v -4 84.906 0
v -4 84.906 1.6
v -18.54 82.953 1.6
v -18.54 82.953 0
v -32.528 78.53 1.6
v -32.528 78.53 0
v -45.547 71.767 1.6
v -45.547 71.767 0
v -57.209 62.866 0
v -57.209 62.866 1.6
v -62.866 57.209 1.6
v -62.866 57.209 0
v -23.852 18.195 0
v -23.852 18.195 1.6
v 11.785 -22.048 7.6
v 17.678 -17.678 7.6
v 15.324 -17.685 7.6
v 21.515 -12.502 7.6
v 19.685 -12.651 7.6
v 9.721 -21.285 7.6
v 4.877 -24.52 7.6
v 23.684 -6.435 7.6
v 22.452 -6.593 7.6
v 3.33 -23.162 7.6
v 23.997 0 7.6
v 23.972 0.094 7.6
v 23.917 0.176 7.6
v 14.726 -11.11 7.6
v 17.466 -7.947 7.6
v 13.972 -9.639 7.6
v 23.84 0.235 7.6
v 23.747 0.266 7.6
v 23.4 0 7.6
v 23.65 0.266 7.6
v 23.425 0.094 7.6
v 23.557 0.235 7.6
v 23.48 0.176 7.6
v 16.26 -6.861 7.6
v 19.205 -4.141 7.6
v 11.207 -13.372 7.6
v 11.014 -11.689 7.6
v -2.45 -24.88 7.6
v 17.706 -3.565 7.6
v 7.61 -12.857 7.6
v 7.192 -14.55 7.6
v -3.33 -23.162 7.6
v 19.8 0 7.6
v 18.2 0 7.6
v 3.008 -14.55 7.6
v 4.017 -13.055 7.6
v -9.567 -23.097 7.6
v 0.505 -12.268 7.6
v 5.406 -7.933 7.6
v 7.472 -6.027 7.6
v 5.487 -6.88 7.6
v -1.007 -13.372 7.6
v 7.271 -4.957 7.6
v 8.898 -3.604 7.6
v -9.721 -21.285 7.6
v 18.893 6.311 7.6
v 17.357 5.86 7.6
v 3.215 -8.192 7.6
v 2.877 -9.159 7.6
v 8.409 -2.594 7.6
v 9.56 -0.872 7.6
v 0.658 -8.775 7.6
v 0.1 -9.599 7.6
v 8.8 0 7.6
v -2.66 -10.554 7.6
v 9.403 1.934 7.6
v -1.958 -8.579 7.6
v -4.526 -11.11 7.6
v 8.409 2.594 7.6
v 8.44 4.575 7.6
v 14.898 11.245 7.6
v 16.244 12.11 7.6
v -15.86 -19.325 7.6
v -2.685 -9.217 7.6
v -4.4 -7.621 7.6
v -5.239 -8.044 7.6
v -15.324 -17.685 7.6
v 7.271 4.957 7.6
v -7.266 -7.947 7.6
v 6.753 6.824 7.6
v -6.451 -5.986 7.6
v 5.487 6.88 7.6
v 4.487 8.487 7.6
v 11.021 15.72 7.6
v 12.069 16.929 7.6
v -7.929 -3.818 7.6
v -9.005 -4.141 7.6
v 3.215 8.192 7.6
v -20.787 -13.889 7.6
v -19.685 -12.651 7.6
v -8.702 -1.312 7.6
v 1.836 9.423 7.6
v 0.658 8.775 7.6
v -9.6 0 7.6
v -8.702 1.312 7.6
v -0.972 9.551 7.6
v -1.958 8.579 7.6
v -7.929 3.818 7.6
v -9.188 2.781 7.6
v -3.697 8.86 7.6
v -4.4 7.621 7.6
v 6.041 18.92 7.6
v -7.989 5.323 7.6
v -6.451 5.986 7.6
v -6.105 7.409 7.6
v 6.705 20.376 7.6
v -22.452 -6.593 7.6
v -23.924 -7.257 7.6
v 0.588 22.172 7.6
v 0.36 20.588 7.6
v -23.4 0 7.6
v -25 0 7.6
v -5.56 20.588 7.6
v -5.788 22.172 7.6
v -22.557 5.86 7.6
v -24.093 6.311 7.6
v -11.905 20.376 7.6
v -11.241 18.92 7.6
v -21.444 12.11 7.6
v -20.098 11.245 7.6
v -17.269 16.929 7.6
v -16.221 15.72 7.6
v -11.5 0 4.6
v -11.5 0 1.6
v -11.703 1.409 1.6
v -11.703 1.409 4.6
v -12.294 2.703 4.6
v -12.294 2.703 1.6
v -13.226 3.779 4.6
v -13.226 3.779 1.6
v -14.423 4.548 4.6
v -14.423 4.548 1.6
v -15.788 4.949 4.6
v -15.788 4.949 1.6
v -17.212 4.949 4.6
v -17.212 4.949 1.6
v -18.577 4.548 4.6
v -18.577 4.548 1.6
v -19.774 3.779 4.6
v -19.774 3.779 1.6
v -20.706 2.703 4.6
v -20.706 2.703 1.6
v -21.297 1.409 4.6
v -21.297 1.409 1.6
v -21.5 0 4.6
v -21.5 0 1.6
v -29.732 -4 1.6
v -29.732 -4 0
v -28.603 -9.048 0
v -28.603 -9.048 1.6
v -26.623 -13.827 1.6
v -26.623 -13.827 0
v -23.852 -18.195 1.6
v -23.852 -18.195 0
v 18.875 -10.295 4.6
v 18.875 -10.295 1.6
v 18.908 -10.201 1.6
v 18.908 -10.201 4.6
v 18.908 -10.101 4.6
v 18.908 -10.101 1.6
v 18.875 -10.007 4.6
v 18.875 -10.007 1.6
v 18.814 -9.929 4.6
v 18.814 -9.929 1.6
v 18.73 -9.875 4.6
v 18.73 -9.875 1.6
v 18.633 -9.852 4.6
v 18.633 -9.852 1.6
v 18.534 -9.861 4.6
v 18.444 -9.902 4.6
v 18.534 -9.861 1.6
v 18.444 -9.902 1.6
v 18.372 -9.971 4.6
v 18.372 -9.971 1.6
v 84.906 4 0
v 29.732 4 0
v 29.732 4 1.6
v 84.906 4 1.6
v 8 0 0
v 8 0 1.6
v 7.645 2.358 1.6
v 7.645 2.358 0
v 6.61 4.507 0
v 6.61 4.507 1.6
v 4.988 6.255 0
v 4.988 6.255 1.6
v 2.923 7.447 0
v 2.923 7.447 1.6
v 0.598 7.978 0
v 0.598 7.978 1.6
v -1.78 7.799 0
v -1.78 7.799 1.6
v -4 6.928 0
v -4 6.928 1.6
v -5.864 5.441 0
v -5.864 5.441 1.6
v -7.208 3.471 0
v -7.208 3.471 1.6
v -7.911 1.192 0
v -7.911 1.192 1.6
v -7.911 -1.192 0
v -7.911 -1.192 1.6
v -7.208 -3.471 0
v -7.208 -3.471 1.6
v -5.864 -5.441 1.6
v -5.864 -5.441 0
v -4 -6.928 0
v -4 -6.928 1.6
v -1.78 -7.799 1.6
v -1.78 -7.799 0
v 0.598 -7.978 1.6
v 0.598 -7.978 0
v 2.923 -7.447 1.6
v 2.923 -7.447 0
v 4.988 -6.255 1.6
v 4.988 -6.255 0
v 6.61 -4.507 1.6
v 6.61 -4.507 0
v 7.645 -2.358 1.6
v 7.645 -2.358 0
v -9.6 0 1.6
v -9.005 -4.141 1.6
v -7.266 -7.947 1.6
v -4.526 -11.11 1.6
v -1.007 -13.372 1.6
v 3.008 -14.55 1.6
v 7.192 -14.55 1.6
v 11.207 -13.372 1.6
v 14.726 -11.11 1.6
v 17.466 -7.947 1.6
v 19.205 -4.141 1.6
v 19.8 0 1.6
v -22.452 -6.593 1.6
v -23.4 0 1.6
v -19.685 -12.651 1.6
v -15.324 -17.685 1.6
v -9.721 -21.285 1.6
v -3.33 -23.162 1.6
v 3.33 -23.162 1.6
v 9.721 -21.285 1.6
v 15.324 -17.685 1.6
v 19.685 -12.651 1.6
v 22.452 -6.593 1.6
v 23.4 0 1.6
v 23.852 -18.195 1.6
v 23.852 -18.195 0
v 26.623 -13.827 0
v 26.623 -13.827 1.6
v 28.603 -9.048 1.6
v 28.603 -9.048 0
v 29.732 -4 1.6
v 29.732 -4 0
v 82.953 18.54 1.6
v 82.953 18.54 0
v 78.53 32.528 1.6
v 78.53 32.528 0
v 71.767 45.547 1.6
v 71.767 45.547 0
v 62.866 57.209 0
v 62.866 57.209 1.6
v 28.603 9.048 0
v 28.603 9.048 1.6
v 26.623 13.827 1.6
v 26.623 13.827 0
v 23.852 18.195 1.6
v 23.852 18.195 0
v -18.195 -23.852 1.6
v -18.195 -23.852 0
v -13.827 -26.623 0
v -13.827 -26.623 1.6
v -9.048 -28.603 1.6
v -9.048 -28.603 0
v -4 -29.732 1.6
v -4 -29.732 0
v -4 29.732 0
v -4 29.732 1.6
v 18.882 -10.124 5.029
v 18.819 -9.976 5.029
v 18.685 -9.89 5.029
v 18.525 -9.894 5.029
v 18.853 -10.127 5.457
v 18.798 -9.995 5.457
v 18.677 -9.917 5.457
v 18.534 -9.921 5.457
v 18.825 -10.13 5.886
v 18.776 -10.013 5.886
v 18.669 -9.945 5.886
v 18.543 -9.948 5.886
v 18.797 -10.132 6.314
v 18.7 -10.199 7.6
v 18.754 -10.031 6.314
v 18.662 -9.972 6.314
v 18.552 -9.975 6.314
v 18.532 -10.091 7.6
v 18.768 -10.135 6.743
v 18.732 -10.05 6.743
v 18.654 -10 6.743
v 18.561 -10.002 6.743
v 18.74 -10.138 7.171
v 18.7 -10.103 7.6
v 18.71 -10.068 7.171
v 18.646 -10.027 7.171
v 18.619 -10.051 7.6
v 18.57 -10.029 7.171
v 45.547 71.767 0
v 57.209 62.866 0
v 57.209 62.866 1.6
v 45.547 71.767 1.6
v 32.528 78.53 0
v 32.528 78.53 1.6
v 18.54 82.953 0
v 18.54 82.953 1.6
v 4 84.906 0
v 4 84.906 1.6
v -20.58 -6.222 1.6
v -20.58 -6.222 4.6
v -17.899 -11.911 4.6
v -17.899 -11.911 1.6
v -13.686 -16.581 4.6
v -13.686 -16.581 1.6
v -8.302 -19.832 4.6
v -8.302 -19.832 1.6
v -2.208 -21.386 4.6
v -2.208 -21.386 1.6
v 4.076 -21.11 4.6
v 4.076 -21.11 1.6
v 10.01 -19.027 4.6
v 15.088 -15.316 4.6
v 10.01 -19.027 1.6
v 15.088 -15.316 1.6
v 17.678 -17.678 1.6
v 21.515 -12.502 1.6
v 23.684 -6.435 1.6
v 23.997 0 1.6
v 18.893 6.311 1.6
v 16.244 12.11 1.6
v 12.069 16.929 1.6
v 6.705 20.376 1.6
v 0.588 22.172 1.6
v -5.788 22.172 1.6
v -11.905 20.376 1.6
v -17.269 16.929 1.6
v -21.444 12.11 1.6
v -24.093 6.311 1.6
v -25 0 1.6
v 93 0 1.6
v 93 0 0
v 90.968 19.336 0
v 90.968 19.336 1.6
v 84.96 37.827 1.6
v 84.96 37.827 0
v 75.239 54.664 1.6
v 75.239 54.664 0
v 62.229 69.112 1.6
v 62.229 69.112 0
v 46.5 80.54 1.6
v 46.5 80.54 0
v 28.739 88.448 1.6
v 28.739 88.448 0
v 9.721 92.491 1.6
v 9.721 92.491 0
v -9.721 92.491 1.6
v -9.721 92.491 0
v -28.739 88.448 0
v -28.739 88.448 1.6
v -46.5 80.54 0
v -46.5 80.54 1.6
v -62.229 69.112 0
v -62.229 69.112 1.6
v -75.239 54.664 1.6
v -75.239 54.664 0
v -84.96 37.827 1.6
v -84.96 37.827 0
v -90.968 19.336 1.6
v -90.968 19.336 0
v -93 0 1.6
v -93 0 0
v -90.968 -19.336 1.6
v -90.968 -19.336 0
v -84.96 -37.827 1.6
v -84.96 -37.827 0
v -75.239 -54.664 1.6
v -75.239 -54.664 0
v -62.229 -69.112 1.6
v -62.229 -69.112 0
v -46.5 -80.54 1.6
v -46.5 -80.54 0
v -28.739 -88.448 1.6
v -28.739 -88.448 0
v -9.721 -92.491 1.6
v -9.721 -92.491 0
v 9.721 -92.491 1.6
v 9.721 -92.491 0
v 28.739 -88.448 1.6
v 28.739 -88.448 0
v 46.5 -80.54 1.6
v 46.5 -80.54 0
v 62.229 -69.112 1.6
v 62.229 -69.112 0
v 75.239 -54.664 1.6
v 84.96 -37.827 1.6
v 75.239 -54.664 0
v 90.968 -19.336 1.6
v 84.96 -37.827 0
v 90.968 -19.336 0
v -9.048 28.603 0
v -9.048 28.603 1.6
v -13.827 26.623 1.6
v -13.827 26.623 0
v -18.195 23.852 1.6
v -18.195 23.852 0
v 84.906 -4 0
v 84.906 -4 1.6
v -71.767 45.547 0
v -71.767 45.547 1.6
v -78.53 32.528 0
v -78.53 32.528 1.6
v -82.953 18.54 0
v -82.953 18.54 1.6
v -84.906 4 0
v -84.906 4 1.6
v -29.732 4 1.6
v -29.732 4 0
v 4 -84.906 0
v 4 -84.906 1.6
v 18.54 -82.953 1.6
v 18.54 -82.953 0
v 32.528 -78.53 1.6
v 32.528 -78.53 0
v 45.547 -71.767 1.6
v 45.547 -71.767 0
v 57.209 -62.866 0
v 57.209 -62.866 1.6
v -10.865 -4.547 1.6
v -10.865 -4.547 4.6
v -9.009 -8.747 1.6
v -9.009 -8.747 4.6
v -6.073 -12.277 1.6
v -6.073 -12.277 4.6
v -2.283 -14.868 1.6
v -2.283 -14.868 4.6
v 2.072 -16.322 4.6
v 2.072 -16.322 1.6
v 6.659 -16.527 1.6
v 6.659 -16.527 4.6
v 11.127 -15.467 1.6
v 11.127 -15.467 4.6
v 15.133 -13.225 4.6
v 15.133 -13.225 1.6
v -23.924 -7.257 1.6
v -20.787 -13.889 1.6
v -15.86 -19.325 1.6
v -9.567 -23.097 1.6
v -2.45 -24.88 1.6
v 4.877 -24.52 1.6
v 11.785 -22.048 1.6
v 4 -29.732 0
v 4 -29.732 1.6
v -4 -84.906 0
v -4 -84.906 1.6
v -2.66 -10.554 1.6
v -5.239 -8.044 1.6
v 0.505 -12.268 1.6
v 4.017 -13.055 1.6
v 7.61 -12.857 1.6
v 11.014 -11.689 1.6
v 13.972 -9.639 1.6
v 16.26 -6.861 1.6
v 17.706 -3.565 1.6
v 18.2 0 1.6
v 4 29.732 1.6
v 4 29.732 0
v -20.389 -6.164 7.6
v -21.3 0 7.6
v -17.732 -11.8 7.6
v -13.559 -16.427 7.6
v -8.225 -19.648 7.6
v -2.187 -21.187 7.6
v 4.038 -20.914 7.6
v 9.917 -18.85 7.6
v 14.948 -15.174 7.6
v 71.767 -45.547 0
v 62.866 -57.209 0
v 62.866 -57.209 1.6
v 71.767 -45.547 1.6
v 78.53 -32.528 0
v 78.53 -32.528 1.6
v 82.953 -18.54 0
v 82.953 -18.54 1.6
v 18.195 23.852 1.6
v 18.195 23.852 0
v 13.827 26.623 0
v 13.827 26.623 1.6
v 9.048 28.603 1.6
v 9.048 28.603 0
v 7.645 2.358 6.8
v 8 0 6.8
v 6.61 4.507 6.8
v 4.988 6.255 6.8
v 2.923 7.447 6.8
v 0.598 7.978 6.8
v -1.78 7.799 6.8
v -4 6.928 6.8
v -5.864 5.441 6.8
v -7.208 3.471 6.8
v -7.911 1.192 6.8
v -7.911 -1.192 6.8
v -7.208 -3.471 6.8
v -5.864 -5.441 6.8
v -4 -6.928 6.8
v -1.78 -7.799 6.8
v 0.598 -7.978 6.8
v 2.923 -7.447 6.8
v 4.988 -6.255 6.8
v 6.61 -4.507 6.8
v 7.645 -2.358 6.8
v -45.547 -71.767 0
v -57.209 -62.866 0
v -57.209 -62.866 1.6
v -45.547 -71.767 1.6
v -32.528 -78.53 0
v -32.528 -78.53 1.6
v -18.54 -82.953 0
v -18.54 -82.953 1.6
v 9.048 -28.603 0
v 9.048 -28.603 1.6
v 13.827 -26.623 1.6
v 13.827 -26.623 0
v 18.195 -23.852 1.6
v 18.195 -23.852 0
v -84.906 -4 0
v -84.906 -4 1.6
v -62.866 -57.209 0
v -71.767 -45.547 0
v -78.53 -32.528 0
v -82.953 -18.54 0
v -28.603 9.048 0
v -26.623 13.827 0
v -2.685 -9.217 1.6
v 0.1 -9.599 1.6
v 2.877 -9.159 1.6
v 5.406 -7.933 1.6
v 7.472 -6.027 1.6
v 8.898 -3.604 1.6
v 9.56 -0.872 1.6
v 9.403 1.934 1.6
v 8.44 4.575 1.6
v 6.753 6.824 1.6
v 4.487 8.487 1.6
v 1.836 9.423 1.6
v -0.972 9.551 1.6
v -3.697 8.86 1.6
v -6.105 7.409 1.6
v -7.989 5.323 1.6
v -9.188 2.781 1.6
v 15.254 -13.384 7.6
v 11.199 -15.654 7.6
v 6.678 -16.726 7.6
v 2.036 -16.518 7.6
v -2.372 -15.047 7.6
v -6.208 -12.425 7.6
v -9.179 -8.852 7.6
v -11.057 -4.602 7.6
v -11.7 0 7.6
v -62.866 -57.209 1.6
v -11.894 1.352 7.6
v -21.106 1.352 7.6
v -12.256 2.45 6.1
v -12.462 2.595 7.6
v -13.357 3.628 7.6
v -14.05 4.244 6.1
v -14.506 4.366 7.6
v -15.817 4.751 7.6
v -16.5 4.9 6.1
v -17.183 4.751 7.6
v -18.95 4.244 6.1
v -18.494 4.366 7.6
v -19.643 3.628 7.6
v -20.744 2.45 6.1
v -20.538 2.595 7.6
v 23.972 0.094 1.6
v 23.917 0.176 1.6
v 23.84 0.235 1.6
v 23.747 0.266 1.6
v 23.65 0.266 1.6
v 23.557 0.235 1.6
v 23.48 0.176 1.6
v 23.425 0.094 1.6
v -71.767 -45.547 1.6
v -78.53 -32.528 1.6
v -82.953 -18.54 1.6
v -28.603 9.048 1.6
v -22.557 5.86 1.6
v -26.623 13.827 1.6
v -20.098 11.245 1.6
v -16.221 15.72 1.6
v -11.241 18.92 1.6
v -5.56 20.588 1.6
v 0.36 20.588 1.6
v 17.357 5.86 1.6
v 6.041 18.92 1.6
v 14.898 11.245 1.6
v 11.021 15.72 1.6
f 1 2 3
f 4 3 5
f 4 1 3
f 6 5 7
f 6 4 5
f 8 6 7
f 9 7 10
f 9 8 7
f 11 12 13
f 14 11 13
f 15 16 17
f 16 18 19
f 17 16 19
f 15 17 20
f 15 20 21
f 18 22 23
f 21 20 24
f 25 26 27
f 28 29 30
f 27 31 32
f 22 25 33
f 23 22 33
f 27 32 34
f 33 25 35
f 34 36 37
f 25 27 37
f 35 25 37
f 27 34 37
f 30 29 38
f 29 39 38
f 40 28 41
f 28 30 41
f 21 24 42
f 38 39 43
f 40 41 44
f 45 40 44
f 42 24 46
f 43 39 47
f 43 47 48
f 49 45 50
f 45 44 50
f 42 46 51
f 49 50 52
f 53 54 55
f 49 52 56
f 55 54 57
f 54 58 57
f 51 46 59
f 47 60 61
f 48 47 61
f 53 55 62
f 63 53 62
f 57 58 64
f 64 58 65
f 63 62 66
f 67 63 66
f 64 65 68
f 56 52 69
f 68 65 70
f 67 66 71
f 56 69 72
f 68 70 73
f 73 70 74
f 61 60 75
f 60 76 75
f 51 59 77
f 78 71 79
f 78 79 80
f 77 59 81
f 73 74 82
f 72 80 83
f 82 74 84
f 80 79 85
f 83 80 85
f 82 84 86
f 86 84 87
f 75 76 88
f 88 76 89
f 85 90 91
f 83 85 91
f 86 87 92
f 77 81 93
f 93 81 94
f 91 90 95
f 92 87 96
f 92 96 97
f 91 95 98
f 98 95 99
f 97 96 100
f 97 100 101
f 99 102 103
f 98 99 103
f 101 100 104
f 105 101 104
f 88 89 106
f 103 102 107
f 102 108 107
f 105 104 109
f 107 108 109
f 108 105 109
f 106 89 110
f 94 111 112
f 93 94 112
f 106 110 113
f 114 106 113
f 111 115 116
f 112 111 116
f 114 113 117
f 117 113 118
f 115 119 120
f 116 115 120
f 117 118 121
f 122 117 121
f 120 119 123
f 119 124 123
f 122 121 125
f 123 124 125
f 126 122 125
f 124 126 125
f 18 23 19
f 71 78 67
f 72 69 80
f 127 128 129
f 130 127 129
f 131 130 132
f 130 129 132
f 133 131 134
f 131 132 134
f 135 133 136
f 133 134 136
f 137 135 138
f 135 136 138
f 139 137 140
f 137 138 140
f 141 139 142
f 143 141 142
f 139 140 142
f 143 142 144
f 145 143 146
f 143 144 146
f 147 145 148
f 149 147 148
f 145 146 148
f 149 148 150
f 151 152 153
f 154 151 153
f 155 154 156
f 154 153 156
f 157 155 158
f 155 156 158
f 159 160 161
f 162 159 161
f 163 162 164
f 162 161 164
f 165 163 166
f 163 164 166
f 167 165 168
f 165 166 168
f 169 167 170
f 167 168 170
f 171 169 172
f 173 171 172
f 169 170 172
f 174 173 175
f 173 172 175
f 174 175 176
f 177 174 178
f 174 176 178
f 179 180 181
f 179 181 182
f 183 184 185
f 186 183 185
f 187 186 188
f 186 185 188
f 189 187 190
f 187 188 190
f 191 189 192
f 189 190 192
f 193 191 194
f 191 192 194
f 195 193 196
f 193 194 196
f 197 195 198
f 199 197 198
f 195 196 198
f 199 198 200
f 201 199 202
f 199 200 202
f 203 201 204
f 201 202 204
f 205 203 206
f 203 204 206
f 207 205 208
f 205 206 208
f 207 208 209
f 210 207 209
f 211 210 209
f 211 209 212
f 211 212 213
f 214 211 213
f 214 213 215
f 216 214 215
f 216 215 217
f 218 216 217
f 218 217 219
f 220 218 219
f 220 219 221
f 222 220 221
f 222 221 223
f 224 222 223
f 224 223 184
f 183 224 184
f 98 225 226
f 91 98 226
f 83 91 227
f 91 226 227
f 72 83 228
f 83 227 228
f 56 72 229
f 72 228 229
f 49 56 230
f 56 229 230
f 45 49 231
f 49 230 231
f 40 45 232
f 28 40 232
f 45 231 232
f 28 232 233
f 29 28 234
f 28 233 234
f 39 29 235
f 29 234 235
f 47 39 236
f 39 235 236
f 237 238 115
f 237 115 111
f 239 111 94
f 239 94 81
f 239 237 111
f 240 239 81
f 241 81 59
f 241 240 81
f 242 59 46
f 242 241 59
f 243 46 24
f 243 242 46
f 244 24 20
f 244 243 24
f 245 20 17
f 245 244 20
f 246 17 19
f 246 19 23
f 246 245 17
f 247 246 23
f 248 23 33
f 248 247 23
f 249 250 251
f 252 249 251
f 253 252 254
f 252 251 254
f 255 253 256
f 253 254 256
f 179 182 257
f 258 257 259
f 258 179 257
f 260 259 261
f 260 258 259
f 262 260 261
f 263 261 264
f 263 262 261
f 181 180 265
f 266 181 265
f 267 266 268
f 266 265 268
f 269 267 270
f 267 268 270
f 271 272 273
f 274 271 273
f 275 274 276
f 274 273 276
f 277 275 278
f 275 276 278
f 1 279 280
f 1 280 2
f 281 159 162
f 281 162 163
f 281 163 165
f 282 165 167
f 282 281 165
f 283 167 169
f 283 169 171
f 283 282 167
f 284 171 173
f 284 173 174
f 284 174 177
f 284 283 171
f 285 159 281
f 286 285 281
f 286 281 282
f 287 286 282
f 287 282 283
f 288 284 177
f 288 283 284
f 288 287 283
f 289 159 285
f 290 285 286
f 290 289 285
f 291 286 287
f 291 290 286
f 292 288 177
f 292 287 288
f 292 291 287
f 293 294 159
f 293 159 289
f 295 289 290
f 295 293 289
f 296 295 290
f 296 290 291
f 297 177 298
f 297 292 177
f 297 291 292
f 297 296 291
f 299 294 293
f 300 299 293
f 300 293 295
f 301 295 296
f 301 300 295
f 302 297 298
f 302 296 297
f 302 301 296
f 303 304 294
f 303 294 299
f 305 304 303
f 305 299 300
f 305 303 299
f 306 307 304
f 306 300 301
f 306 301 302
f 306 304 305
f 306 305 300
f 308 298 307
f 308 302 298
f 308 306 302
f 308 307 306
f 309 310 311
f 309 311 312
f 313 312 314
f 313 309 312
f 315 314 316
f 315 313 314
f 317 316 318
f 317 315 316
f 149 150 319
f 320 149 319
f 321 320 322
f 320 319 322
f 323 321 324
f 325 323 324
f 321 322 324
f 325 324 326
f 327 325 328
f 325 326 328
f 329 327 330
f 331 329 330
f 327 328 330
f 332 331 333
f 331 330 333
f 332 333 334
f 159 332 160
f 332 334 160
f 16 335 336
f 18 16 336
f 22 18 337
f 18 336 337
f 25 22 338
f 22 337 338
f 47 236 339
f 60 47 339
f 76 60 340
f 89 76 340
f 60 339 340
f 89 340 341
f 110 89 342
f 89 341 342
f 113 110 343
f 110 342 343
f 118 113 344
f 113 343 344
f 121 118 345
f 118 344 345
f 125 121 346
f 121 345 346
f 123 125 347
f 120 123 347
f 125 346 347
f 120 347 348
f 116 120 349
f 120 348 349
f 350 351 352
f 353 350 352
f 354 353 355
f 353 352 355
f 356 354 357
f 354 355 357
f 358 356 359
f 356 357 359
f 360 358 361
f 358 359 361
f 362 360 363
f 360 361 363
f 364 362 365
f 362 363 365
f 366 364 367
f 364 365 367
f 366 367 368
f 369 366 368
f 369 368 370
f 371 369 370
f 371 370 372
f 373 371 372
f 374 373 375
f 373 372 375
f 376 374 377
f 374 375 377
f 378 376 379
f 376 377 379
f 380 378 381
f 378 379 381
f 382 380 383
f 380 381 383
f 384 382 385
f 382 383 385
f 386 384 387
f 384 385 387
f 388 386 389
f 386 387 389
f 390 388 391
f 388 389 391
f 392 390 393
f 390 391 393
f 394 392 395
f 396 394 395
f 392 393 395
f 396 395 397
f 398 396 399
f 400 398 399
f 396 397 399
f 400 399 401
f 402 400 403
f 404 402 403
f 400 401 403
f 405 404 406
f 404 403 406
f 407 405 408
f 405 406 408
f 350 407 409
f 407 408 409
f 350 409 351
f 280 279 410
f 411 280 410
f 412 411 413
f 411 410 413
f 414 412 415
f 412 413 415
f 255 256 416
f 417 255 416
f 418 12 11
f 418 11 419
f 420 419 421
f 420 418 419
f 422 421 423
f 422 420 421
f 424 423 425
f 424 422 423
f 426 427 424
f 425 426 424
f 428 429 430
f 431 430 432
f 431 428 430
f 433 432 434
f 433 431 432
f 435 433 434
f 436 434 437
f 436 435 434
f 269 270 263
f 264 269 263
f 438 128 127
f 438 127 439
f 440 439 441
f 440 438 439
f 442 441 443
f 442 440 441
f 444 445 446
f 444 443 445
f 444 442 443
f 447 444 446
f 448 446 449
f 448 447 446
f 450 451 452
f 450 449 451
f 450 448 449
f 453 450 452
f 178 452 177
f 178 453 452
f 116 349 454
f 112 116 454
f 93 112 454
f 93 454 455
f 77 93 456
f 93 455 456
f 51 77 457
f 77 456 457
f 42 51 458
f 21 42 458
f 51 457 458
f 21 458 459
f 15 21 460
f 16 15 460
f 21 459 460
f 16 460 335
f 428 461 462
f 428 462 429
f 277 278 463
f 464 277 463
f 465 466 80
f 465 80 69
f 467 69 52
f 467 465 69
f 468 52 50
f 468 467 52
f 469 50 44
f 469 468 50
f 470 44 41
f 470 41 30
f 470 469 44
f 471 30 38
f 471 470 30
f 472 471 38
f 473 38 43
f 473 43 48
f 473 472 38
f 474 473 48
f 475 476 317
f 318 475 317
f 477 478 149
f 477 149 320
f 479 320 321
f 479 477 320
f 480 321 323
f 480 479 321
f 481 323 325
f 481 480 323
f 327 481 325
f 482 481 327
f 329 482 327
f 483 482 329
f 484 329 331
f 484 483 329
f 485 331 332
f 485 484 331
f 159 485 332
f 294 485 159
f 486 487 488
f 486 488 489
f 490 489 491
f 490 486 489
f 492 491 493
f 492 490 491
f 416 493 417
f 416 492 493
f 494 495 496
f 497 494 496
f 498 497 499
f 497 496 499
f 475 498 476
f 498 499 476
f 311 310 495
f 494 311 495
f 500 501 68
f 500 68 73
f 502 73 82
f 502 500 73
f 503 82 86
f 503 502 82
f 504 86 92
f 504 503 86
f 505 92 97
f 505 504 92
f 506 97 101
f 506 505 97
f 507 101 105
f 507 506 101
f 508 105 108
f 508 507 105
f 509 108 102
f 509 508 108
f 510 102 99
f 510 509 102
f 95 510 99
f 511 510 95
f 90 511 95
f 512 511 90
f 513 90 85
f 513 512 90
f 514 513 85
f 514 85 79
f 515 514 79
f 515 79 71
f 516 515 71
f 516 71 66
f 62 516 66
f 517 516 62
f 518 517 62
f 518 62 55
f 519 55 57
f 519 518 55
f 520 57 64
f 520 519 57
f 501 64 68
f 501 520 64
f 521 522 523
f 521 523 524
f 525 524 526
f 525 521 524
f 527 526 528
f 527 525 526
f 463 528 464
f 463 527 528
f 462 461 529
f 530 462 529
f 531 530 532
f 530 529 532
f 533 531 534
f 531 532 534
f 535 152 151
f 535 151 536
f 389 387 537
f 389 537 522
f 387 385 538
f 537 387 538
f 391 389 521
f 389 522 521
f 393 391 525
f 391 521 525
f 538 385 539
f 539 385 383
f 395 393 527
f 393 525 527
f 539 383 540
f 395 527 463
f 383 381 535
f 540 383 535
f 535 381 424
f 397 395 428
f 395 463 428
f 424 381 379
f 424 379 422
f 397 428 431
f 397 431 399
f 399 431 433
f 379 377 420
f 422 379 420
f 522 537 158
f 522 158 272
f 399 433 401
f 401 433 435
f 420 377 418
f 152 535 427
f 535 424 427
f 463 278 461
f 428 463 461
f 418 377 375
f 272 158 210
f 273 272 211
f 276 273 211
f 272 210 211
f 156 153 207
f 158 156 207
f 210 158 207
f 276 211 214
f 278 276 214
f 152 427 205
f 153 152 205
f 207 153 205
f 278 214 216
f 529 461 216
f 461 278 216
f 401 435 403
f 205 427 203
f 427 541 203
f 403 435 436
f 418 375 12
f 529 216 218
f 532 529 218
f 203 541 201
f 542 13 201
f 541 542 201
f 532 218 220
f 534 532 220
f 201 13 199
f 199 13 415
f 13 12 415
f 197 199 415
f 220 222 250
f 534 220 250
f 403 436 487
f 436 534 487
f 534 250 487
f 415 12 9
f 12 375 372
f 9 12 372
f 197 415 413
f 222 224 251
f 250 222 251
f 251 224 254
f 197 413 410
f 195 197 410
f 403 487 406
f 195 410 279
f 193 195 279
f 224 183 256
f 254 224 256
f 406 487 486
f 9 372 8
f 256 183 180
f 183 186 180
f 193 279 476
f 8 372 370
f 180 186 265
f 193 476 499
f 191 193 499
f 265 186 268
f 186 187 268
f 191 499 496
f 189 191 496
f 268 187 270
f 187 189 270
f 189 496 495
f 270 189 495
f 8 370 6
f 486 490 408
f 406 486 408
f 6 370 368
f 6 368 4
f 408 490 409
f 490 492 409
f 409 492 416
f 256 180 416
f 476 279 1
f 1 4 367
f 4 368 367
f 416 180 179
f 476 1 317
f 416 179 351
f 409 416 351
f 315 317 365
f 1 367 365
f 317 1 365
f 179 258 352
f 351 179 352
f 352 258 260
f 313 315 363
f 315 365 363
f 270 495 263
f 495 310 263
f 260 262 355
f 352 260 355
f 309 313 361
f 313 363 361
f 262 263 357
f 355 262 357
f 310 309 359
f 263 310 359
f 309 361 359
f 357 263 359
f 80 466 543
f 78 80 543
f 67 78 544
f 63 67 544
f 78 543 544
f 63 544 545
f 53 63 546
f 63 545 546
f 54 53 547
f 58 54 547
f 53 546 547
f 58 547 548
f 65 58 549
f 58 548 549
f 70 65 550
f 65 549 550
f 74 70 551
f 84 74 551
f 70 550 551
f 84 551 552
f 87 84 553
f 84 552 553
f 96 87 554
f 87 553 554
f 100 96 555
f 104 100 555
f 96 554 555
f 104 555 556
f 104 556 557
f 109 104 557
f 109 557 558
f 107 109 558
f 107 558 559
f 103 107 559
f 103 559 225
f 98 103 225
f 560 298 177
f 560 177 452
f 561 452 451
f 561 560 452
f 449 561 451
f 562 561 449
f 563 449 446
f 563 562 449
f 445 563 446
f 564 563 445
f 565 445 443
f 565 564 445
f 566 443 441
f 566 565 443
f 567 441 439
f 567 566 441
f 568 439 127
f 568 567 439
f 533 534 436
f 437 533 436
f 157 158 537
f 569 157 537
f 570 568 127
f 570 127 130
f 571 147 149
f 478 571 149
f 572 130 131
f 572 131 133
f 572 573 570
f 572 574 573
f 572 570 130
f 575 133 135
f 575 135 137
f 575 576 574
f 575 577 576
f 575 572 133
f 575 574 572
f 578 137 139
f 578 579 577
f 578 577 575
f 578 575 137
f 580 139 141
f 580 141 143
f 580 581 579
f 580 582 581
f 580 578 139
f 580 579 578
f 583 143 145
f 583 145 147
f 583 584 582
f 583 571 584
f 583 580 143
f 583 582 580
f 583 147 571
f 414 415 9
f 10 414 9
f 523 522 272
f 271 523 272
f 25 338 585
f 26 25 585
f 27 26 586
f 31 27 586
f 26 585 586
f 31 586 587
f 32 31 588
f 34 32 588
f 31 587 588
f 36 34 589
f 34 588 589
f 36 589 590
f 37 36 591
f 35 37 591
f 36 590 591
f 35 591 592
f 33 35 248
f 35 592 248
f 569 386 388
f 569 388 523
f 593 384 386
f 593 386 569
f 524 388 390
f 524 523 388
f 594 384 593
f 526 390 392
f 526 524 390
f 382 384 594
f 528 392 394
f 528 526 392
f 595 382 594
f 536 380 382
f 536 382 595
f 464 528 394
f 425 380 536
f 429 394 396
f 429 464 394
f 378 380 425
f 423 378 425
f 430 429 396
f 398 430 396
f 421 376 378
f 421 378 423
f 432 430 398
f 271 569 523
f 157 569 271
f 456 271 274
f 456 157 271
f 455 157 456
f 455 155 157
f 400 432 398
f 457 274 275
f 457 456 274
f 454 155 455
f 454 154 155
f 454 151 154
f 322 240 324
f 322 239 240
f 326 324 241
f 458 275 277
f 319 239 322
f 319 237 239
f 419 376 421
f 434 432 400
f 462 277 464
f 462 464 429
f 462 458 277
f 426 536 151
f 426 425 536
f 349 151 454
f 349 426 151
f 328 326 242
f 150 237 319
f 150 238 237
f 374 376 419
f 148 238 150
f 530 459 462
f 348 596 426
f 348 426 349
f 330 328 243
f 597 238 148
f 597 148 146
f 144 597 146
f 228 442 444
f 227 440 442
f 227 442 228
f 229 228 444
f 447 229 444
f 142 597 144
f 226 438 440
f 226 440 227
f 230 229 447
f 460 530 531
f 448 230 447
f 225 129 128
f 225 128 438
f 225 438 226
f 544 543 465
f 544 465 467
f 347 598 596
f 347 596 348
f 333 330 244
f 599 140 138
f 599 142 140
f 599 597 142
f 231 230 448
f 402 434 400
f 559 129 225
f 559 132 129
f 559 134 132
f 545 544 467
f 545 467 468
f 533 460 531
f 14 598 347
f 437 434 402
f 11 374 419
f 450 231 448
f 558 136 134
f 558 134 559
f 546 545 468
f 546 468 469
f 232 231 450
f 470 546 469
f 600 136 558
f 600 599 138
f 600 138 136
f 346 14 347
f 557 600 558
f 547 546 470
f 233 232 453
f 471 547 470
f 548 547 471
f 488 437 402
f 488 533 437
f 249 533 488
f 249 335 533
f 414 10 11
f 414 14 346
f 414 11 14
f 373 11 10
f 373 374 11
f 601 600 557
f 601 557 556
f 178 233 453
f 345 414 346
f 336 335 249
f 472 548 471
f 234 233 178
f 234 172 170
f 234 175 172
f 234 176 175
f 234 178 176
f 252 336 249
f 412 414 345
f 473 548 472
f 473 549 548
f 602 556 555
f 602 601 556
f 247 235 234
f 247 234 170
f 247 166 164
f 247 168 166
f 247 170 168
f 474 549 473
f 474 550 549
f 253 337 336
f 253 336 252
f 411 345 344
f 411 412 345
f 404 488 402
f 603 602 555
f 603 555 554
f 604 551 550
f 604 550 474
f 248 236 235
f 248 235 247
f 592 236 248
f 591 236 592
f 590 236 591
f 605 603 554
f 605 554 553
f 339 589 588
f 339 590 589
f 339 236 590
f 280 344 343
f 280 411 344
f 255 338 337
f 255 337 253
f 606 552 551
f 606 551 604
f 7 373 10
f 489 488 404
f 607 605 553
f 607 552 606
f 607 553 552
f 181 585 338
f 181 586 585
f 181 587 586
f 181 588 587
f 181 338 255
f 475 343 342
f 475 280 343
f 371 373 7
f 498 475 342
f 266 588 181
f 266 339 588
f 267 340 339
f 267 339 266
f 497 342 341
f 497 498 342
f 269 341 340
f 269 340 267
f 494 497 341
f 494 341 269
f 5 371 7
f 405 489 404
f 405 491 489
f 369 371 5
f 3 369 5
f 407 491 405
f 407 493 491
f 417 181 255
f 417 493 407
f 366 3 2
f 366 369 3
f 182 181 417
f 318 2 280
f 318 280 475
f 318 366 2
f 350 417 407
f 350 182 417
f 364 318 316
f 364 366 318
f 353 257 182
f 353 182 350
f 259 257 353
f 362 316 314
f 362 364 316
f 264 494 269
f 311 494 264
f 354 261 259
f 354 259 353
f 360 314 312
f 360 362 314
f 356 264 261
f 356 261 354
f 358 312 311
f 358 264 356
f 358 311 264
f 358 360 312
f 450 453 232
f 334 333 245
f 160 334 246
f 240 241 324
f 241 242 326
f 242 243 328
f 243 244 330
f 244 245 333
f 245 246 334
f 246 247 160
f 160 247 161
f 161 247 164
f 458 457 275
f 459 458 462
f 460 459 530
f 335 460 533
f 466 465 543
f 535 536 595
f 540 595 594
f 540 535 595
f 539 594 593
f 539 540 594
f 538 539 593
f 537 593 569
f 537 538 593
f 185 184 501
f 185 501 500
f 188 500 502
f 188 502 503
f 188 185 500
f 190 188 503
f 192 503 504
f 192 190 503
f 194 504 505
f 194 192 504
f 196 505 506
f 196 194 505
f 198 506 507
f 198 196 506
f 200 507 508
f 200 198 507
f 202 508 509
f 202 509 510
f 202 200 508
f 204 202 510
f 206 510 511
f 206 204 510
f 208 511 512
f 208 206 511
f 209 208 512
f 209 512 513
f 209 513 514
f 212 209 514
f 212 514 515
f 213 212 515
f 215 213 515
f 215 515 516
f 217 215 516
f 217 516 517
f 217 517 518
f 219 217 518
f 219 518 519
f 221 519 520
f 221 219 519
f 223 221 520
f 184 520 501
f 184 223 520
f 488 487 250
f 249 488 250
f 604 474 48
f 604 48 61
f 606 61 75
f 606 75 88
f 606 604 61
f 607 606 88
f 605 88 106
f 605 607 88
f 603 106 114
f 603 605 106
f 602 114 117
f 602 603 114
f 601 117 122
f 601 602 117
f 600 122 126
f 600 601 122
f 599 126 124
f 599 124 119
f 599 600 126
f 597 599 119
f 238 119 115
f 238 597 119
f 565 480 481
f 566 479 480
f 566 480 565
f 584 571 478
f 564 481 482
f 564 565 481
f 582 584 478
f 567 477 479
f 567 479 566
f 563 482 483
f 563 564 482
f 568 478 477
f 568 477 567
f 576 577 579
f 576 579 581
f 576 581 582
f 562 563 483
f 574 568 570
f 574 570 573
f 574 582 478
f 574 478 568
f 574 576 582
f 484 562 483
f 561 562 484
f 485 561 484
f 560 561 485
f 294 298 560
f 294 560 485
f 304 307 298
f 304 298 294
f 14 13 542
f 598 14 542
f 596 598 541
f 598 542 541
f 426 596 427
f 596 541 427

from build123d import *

# Parameters (mm, degrees)
SKETCH_R           = 93
PAD_DEPTH          = 1.6
POCKET_DEPTH       = 527.6981773351
POLARPATTERN_COUNT = 4
SKETCH003_R        = 8
POCKET001_DEPTH    = 1.601
SKETCH001_R        = 8
PAD001_DEPTH       = 6
CHAMFER002_SIZE2   = 0.2
CHAMFER002_SIZE    = 3
CHAMFER_SIZE       = 0.8


with BuildPart() as part:
    # Sketch → Pad (new body)
    with BuildSketch(Plane.XY):
        Circle(SKETCH_R)
    extrude(amount=PAD_DEPTH)

    # Sketch002 → Pocket (cut, through all)
    with BuildSketch(Plane.XY):
        with BuildLine():
            Line((-29.7321374946, 4), (-84.9058301885, 4))
            ThreePointArc((-62.8659154133, 57.2090611638), (-78.5297602635, 32.528091751), (-84.9058301885, 4))
            Line((-62.8659154133, 57.2090611638), (-23.8522231664, 18.1953689169))
            ThreePointArc((-23.8522231664, 18.1953689169), (-27.7163859753, 11.480502971), (-29.7321374946, 4))
        make_face()
        with BuildLine():
            Line((-18.1953689169, 23.8522231664), (-57.2090611638, 62.8659154133))
            ThreePointArc((-4, 84.9058301885), (-32.528091751, 78.5297602635), (-57.2090611638, 62.8659154133))
            Line((-4, 29.7321374946), (-4, 84.9058301885))
            ThreePointArc((-4, 29.7321374946), (-11.480502971, 27.7163859753), (-18.1953689169, 23.8522231664))
        make_face()
    pocket = extrude(amount=POCKET_DEPTH, mode=Mode.SUBTRACT)

    # PolarPattern: Pocket ×4 about axis
    polarpattern_axis = Axis((0, 0, 0), (0, 0, 1))
    for i in range(1, POLARPATTERN_COUNT):
        add(pocket.rotate(polarpattern_axis, i * 360 / POLARPATTERN_COUNT), mode=Mode.SUBTRACT)

    # Sketch003 → Pocket001 (cut, through all)
    with BuildSketch(Plane.XY.offset(1.6)):
        Circle(SKETCH003_R)
    extrude(amount=-POCKET001_DEPTH, mode=Mode.SUBTRACT)

    # Sketch001 → Pad001 (join)
    with BuildSketch(Plane.XY.offset(1.6)):
        with BuildLine():
            ThreePointArc((-23.4, 0), (0, -23.4), (23.4, 0))
            ThreePointArc((23.9970767333, 0), (23.6985383667, 0.2704222444), (23.4, 0))
            ThreePointArc((17.6776695297, -17.6776695297), (22.8235419267, -9.5488497004), (23.9970767333, 0))
            ThreePointArc((-25, 0), (-9.5670858091, -23.0969883128), (17.6776695297, -17.6776695297))
            ThreePointArc((19.8, 0), (-2.6, 22.4), (-25, 0))
            ThreePointArc((-9.6, 6e-10), (5.0999999997, -14.7000000003), (19.8, 0))
            ThreePointArc((-5.2392156863, -8.0442910808), (8.4396821797, 4.5751245563), (-9.6, 0))
            ThreePointArc((-5.2392156863, -8.0442910808), (9.3524272192, -12.3905957381), (18.2, 0))
            ThreePointArc((18.2, 0), (-2.6, 20.8), (-23.4, 0))
        make_face()
        Circle(SKETCH001_R, mode=Mode.SUBTRACT)
        with BuildLine():
            ThreePointArc((-11.5, 0), (-16.5, 5), (-21.5, 0))
            ThreePointArc((-21.5, 0), (-5.3119919625, -20.8334524597), (18.8751387339, -10.2946169319))
            ThreePointArc((18.8751387339, -10.2946169319), (18.7741114914, -9.8986944388), (18.3719108937, -9.9707763607))
            ThreePointArc((-11.5, 0), (-0.1557720255, -15.746010937), (18.3719108937, -9.9707763607))
        make_face()
    extrude(amount=PAD001_DEPTH)

    # Chamfer002
    chamfer002_edges = [part.edges().sort_by_distance(p)[0] for p in [
        (-5.311992, -20.833452, 7.6),
    ]]
    chamfer002_side = part.faces().sort_by_distance((-5.311992, -20.833452, 4.6))[0]
    chamfer(chamfer002_edges, length=CHAMFER002_SIZE, length2=CHAMFER002_SIZE2, reference=chamfer002_side)

    # Chamfer
    chamfer_edges = [part.edges().sort_by_distance(p)[0] for p in [
        (-8, 0, 7.6),
    ]]
    chamfer(chamfer_edges, length=CHAMFER_SIZE)


solid = part.part
